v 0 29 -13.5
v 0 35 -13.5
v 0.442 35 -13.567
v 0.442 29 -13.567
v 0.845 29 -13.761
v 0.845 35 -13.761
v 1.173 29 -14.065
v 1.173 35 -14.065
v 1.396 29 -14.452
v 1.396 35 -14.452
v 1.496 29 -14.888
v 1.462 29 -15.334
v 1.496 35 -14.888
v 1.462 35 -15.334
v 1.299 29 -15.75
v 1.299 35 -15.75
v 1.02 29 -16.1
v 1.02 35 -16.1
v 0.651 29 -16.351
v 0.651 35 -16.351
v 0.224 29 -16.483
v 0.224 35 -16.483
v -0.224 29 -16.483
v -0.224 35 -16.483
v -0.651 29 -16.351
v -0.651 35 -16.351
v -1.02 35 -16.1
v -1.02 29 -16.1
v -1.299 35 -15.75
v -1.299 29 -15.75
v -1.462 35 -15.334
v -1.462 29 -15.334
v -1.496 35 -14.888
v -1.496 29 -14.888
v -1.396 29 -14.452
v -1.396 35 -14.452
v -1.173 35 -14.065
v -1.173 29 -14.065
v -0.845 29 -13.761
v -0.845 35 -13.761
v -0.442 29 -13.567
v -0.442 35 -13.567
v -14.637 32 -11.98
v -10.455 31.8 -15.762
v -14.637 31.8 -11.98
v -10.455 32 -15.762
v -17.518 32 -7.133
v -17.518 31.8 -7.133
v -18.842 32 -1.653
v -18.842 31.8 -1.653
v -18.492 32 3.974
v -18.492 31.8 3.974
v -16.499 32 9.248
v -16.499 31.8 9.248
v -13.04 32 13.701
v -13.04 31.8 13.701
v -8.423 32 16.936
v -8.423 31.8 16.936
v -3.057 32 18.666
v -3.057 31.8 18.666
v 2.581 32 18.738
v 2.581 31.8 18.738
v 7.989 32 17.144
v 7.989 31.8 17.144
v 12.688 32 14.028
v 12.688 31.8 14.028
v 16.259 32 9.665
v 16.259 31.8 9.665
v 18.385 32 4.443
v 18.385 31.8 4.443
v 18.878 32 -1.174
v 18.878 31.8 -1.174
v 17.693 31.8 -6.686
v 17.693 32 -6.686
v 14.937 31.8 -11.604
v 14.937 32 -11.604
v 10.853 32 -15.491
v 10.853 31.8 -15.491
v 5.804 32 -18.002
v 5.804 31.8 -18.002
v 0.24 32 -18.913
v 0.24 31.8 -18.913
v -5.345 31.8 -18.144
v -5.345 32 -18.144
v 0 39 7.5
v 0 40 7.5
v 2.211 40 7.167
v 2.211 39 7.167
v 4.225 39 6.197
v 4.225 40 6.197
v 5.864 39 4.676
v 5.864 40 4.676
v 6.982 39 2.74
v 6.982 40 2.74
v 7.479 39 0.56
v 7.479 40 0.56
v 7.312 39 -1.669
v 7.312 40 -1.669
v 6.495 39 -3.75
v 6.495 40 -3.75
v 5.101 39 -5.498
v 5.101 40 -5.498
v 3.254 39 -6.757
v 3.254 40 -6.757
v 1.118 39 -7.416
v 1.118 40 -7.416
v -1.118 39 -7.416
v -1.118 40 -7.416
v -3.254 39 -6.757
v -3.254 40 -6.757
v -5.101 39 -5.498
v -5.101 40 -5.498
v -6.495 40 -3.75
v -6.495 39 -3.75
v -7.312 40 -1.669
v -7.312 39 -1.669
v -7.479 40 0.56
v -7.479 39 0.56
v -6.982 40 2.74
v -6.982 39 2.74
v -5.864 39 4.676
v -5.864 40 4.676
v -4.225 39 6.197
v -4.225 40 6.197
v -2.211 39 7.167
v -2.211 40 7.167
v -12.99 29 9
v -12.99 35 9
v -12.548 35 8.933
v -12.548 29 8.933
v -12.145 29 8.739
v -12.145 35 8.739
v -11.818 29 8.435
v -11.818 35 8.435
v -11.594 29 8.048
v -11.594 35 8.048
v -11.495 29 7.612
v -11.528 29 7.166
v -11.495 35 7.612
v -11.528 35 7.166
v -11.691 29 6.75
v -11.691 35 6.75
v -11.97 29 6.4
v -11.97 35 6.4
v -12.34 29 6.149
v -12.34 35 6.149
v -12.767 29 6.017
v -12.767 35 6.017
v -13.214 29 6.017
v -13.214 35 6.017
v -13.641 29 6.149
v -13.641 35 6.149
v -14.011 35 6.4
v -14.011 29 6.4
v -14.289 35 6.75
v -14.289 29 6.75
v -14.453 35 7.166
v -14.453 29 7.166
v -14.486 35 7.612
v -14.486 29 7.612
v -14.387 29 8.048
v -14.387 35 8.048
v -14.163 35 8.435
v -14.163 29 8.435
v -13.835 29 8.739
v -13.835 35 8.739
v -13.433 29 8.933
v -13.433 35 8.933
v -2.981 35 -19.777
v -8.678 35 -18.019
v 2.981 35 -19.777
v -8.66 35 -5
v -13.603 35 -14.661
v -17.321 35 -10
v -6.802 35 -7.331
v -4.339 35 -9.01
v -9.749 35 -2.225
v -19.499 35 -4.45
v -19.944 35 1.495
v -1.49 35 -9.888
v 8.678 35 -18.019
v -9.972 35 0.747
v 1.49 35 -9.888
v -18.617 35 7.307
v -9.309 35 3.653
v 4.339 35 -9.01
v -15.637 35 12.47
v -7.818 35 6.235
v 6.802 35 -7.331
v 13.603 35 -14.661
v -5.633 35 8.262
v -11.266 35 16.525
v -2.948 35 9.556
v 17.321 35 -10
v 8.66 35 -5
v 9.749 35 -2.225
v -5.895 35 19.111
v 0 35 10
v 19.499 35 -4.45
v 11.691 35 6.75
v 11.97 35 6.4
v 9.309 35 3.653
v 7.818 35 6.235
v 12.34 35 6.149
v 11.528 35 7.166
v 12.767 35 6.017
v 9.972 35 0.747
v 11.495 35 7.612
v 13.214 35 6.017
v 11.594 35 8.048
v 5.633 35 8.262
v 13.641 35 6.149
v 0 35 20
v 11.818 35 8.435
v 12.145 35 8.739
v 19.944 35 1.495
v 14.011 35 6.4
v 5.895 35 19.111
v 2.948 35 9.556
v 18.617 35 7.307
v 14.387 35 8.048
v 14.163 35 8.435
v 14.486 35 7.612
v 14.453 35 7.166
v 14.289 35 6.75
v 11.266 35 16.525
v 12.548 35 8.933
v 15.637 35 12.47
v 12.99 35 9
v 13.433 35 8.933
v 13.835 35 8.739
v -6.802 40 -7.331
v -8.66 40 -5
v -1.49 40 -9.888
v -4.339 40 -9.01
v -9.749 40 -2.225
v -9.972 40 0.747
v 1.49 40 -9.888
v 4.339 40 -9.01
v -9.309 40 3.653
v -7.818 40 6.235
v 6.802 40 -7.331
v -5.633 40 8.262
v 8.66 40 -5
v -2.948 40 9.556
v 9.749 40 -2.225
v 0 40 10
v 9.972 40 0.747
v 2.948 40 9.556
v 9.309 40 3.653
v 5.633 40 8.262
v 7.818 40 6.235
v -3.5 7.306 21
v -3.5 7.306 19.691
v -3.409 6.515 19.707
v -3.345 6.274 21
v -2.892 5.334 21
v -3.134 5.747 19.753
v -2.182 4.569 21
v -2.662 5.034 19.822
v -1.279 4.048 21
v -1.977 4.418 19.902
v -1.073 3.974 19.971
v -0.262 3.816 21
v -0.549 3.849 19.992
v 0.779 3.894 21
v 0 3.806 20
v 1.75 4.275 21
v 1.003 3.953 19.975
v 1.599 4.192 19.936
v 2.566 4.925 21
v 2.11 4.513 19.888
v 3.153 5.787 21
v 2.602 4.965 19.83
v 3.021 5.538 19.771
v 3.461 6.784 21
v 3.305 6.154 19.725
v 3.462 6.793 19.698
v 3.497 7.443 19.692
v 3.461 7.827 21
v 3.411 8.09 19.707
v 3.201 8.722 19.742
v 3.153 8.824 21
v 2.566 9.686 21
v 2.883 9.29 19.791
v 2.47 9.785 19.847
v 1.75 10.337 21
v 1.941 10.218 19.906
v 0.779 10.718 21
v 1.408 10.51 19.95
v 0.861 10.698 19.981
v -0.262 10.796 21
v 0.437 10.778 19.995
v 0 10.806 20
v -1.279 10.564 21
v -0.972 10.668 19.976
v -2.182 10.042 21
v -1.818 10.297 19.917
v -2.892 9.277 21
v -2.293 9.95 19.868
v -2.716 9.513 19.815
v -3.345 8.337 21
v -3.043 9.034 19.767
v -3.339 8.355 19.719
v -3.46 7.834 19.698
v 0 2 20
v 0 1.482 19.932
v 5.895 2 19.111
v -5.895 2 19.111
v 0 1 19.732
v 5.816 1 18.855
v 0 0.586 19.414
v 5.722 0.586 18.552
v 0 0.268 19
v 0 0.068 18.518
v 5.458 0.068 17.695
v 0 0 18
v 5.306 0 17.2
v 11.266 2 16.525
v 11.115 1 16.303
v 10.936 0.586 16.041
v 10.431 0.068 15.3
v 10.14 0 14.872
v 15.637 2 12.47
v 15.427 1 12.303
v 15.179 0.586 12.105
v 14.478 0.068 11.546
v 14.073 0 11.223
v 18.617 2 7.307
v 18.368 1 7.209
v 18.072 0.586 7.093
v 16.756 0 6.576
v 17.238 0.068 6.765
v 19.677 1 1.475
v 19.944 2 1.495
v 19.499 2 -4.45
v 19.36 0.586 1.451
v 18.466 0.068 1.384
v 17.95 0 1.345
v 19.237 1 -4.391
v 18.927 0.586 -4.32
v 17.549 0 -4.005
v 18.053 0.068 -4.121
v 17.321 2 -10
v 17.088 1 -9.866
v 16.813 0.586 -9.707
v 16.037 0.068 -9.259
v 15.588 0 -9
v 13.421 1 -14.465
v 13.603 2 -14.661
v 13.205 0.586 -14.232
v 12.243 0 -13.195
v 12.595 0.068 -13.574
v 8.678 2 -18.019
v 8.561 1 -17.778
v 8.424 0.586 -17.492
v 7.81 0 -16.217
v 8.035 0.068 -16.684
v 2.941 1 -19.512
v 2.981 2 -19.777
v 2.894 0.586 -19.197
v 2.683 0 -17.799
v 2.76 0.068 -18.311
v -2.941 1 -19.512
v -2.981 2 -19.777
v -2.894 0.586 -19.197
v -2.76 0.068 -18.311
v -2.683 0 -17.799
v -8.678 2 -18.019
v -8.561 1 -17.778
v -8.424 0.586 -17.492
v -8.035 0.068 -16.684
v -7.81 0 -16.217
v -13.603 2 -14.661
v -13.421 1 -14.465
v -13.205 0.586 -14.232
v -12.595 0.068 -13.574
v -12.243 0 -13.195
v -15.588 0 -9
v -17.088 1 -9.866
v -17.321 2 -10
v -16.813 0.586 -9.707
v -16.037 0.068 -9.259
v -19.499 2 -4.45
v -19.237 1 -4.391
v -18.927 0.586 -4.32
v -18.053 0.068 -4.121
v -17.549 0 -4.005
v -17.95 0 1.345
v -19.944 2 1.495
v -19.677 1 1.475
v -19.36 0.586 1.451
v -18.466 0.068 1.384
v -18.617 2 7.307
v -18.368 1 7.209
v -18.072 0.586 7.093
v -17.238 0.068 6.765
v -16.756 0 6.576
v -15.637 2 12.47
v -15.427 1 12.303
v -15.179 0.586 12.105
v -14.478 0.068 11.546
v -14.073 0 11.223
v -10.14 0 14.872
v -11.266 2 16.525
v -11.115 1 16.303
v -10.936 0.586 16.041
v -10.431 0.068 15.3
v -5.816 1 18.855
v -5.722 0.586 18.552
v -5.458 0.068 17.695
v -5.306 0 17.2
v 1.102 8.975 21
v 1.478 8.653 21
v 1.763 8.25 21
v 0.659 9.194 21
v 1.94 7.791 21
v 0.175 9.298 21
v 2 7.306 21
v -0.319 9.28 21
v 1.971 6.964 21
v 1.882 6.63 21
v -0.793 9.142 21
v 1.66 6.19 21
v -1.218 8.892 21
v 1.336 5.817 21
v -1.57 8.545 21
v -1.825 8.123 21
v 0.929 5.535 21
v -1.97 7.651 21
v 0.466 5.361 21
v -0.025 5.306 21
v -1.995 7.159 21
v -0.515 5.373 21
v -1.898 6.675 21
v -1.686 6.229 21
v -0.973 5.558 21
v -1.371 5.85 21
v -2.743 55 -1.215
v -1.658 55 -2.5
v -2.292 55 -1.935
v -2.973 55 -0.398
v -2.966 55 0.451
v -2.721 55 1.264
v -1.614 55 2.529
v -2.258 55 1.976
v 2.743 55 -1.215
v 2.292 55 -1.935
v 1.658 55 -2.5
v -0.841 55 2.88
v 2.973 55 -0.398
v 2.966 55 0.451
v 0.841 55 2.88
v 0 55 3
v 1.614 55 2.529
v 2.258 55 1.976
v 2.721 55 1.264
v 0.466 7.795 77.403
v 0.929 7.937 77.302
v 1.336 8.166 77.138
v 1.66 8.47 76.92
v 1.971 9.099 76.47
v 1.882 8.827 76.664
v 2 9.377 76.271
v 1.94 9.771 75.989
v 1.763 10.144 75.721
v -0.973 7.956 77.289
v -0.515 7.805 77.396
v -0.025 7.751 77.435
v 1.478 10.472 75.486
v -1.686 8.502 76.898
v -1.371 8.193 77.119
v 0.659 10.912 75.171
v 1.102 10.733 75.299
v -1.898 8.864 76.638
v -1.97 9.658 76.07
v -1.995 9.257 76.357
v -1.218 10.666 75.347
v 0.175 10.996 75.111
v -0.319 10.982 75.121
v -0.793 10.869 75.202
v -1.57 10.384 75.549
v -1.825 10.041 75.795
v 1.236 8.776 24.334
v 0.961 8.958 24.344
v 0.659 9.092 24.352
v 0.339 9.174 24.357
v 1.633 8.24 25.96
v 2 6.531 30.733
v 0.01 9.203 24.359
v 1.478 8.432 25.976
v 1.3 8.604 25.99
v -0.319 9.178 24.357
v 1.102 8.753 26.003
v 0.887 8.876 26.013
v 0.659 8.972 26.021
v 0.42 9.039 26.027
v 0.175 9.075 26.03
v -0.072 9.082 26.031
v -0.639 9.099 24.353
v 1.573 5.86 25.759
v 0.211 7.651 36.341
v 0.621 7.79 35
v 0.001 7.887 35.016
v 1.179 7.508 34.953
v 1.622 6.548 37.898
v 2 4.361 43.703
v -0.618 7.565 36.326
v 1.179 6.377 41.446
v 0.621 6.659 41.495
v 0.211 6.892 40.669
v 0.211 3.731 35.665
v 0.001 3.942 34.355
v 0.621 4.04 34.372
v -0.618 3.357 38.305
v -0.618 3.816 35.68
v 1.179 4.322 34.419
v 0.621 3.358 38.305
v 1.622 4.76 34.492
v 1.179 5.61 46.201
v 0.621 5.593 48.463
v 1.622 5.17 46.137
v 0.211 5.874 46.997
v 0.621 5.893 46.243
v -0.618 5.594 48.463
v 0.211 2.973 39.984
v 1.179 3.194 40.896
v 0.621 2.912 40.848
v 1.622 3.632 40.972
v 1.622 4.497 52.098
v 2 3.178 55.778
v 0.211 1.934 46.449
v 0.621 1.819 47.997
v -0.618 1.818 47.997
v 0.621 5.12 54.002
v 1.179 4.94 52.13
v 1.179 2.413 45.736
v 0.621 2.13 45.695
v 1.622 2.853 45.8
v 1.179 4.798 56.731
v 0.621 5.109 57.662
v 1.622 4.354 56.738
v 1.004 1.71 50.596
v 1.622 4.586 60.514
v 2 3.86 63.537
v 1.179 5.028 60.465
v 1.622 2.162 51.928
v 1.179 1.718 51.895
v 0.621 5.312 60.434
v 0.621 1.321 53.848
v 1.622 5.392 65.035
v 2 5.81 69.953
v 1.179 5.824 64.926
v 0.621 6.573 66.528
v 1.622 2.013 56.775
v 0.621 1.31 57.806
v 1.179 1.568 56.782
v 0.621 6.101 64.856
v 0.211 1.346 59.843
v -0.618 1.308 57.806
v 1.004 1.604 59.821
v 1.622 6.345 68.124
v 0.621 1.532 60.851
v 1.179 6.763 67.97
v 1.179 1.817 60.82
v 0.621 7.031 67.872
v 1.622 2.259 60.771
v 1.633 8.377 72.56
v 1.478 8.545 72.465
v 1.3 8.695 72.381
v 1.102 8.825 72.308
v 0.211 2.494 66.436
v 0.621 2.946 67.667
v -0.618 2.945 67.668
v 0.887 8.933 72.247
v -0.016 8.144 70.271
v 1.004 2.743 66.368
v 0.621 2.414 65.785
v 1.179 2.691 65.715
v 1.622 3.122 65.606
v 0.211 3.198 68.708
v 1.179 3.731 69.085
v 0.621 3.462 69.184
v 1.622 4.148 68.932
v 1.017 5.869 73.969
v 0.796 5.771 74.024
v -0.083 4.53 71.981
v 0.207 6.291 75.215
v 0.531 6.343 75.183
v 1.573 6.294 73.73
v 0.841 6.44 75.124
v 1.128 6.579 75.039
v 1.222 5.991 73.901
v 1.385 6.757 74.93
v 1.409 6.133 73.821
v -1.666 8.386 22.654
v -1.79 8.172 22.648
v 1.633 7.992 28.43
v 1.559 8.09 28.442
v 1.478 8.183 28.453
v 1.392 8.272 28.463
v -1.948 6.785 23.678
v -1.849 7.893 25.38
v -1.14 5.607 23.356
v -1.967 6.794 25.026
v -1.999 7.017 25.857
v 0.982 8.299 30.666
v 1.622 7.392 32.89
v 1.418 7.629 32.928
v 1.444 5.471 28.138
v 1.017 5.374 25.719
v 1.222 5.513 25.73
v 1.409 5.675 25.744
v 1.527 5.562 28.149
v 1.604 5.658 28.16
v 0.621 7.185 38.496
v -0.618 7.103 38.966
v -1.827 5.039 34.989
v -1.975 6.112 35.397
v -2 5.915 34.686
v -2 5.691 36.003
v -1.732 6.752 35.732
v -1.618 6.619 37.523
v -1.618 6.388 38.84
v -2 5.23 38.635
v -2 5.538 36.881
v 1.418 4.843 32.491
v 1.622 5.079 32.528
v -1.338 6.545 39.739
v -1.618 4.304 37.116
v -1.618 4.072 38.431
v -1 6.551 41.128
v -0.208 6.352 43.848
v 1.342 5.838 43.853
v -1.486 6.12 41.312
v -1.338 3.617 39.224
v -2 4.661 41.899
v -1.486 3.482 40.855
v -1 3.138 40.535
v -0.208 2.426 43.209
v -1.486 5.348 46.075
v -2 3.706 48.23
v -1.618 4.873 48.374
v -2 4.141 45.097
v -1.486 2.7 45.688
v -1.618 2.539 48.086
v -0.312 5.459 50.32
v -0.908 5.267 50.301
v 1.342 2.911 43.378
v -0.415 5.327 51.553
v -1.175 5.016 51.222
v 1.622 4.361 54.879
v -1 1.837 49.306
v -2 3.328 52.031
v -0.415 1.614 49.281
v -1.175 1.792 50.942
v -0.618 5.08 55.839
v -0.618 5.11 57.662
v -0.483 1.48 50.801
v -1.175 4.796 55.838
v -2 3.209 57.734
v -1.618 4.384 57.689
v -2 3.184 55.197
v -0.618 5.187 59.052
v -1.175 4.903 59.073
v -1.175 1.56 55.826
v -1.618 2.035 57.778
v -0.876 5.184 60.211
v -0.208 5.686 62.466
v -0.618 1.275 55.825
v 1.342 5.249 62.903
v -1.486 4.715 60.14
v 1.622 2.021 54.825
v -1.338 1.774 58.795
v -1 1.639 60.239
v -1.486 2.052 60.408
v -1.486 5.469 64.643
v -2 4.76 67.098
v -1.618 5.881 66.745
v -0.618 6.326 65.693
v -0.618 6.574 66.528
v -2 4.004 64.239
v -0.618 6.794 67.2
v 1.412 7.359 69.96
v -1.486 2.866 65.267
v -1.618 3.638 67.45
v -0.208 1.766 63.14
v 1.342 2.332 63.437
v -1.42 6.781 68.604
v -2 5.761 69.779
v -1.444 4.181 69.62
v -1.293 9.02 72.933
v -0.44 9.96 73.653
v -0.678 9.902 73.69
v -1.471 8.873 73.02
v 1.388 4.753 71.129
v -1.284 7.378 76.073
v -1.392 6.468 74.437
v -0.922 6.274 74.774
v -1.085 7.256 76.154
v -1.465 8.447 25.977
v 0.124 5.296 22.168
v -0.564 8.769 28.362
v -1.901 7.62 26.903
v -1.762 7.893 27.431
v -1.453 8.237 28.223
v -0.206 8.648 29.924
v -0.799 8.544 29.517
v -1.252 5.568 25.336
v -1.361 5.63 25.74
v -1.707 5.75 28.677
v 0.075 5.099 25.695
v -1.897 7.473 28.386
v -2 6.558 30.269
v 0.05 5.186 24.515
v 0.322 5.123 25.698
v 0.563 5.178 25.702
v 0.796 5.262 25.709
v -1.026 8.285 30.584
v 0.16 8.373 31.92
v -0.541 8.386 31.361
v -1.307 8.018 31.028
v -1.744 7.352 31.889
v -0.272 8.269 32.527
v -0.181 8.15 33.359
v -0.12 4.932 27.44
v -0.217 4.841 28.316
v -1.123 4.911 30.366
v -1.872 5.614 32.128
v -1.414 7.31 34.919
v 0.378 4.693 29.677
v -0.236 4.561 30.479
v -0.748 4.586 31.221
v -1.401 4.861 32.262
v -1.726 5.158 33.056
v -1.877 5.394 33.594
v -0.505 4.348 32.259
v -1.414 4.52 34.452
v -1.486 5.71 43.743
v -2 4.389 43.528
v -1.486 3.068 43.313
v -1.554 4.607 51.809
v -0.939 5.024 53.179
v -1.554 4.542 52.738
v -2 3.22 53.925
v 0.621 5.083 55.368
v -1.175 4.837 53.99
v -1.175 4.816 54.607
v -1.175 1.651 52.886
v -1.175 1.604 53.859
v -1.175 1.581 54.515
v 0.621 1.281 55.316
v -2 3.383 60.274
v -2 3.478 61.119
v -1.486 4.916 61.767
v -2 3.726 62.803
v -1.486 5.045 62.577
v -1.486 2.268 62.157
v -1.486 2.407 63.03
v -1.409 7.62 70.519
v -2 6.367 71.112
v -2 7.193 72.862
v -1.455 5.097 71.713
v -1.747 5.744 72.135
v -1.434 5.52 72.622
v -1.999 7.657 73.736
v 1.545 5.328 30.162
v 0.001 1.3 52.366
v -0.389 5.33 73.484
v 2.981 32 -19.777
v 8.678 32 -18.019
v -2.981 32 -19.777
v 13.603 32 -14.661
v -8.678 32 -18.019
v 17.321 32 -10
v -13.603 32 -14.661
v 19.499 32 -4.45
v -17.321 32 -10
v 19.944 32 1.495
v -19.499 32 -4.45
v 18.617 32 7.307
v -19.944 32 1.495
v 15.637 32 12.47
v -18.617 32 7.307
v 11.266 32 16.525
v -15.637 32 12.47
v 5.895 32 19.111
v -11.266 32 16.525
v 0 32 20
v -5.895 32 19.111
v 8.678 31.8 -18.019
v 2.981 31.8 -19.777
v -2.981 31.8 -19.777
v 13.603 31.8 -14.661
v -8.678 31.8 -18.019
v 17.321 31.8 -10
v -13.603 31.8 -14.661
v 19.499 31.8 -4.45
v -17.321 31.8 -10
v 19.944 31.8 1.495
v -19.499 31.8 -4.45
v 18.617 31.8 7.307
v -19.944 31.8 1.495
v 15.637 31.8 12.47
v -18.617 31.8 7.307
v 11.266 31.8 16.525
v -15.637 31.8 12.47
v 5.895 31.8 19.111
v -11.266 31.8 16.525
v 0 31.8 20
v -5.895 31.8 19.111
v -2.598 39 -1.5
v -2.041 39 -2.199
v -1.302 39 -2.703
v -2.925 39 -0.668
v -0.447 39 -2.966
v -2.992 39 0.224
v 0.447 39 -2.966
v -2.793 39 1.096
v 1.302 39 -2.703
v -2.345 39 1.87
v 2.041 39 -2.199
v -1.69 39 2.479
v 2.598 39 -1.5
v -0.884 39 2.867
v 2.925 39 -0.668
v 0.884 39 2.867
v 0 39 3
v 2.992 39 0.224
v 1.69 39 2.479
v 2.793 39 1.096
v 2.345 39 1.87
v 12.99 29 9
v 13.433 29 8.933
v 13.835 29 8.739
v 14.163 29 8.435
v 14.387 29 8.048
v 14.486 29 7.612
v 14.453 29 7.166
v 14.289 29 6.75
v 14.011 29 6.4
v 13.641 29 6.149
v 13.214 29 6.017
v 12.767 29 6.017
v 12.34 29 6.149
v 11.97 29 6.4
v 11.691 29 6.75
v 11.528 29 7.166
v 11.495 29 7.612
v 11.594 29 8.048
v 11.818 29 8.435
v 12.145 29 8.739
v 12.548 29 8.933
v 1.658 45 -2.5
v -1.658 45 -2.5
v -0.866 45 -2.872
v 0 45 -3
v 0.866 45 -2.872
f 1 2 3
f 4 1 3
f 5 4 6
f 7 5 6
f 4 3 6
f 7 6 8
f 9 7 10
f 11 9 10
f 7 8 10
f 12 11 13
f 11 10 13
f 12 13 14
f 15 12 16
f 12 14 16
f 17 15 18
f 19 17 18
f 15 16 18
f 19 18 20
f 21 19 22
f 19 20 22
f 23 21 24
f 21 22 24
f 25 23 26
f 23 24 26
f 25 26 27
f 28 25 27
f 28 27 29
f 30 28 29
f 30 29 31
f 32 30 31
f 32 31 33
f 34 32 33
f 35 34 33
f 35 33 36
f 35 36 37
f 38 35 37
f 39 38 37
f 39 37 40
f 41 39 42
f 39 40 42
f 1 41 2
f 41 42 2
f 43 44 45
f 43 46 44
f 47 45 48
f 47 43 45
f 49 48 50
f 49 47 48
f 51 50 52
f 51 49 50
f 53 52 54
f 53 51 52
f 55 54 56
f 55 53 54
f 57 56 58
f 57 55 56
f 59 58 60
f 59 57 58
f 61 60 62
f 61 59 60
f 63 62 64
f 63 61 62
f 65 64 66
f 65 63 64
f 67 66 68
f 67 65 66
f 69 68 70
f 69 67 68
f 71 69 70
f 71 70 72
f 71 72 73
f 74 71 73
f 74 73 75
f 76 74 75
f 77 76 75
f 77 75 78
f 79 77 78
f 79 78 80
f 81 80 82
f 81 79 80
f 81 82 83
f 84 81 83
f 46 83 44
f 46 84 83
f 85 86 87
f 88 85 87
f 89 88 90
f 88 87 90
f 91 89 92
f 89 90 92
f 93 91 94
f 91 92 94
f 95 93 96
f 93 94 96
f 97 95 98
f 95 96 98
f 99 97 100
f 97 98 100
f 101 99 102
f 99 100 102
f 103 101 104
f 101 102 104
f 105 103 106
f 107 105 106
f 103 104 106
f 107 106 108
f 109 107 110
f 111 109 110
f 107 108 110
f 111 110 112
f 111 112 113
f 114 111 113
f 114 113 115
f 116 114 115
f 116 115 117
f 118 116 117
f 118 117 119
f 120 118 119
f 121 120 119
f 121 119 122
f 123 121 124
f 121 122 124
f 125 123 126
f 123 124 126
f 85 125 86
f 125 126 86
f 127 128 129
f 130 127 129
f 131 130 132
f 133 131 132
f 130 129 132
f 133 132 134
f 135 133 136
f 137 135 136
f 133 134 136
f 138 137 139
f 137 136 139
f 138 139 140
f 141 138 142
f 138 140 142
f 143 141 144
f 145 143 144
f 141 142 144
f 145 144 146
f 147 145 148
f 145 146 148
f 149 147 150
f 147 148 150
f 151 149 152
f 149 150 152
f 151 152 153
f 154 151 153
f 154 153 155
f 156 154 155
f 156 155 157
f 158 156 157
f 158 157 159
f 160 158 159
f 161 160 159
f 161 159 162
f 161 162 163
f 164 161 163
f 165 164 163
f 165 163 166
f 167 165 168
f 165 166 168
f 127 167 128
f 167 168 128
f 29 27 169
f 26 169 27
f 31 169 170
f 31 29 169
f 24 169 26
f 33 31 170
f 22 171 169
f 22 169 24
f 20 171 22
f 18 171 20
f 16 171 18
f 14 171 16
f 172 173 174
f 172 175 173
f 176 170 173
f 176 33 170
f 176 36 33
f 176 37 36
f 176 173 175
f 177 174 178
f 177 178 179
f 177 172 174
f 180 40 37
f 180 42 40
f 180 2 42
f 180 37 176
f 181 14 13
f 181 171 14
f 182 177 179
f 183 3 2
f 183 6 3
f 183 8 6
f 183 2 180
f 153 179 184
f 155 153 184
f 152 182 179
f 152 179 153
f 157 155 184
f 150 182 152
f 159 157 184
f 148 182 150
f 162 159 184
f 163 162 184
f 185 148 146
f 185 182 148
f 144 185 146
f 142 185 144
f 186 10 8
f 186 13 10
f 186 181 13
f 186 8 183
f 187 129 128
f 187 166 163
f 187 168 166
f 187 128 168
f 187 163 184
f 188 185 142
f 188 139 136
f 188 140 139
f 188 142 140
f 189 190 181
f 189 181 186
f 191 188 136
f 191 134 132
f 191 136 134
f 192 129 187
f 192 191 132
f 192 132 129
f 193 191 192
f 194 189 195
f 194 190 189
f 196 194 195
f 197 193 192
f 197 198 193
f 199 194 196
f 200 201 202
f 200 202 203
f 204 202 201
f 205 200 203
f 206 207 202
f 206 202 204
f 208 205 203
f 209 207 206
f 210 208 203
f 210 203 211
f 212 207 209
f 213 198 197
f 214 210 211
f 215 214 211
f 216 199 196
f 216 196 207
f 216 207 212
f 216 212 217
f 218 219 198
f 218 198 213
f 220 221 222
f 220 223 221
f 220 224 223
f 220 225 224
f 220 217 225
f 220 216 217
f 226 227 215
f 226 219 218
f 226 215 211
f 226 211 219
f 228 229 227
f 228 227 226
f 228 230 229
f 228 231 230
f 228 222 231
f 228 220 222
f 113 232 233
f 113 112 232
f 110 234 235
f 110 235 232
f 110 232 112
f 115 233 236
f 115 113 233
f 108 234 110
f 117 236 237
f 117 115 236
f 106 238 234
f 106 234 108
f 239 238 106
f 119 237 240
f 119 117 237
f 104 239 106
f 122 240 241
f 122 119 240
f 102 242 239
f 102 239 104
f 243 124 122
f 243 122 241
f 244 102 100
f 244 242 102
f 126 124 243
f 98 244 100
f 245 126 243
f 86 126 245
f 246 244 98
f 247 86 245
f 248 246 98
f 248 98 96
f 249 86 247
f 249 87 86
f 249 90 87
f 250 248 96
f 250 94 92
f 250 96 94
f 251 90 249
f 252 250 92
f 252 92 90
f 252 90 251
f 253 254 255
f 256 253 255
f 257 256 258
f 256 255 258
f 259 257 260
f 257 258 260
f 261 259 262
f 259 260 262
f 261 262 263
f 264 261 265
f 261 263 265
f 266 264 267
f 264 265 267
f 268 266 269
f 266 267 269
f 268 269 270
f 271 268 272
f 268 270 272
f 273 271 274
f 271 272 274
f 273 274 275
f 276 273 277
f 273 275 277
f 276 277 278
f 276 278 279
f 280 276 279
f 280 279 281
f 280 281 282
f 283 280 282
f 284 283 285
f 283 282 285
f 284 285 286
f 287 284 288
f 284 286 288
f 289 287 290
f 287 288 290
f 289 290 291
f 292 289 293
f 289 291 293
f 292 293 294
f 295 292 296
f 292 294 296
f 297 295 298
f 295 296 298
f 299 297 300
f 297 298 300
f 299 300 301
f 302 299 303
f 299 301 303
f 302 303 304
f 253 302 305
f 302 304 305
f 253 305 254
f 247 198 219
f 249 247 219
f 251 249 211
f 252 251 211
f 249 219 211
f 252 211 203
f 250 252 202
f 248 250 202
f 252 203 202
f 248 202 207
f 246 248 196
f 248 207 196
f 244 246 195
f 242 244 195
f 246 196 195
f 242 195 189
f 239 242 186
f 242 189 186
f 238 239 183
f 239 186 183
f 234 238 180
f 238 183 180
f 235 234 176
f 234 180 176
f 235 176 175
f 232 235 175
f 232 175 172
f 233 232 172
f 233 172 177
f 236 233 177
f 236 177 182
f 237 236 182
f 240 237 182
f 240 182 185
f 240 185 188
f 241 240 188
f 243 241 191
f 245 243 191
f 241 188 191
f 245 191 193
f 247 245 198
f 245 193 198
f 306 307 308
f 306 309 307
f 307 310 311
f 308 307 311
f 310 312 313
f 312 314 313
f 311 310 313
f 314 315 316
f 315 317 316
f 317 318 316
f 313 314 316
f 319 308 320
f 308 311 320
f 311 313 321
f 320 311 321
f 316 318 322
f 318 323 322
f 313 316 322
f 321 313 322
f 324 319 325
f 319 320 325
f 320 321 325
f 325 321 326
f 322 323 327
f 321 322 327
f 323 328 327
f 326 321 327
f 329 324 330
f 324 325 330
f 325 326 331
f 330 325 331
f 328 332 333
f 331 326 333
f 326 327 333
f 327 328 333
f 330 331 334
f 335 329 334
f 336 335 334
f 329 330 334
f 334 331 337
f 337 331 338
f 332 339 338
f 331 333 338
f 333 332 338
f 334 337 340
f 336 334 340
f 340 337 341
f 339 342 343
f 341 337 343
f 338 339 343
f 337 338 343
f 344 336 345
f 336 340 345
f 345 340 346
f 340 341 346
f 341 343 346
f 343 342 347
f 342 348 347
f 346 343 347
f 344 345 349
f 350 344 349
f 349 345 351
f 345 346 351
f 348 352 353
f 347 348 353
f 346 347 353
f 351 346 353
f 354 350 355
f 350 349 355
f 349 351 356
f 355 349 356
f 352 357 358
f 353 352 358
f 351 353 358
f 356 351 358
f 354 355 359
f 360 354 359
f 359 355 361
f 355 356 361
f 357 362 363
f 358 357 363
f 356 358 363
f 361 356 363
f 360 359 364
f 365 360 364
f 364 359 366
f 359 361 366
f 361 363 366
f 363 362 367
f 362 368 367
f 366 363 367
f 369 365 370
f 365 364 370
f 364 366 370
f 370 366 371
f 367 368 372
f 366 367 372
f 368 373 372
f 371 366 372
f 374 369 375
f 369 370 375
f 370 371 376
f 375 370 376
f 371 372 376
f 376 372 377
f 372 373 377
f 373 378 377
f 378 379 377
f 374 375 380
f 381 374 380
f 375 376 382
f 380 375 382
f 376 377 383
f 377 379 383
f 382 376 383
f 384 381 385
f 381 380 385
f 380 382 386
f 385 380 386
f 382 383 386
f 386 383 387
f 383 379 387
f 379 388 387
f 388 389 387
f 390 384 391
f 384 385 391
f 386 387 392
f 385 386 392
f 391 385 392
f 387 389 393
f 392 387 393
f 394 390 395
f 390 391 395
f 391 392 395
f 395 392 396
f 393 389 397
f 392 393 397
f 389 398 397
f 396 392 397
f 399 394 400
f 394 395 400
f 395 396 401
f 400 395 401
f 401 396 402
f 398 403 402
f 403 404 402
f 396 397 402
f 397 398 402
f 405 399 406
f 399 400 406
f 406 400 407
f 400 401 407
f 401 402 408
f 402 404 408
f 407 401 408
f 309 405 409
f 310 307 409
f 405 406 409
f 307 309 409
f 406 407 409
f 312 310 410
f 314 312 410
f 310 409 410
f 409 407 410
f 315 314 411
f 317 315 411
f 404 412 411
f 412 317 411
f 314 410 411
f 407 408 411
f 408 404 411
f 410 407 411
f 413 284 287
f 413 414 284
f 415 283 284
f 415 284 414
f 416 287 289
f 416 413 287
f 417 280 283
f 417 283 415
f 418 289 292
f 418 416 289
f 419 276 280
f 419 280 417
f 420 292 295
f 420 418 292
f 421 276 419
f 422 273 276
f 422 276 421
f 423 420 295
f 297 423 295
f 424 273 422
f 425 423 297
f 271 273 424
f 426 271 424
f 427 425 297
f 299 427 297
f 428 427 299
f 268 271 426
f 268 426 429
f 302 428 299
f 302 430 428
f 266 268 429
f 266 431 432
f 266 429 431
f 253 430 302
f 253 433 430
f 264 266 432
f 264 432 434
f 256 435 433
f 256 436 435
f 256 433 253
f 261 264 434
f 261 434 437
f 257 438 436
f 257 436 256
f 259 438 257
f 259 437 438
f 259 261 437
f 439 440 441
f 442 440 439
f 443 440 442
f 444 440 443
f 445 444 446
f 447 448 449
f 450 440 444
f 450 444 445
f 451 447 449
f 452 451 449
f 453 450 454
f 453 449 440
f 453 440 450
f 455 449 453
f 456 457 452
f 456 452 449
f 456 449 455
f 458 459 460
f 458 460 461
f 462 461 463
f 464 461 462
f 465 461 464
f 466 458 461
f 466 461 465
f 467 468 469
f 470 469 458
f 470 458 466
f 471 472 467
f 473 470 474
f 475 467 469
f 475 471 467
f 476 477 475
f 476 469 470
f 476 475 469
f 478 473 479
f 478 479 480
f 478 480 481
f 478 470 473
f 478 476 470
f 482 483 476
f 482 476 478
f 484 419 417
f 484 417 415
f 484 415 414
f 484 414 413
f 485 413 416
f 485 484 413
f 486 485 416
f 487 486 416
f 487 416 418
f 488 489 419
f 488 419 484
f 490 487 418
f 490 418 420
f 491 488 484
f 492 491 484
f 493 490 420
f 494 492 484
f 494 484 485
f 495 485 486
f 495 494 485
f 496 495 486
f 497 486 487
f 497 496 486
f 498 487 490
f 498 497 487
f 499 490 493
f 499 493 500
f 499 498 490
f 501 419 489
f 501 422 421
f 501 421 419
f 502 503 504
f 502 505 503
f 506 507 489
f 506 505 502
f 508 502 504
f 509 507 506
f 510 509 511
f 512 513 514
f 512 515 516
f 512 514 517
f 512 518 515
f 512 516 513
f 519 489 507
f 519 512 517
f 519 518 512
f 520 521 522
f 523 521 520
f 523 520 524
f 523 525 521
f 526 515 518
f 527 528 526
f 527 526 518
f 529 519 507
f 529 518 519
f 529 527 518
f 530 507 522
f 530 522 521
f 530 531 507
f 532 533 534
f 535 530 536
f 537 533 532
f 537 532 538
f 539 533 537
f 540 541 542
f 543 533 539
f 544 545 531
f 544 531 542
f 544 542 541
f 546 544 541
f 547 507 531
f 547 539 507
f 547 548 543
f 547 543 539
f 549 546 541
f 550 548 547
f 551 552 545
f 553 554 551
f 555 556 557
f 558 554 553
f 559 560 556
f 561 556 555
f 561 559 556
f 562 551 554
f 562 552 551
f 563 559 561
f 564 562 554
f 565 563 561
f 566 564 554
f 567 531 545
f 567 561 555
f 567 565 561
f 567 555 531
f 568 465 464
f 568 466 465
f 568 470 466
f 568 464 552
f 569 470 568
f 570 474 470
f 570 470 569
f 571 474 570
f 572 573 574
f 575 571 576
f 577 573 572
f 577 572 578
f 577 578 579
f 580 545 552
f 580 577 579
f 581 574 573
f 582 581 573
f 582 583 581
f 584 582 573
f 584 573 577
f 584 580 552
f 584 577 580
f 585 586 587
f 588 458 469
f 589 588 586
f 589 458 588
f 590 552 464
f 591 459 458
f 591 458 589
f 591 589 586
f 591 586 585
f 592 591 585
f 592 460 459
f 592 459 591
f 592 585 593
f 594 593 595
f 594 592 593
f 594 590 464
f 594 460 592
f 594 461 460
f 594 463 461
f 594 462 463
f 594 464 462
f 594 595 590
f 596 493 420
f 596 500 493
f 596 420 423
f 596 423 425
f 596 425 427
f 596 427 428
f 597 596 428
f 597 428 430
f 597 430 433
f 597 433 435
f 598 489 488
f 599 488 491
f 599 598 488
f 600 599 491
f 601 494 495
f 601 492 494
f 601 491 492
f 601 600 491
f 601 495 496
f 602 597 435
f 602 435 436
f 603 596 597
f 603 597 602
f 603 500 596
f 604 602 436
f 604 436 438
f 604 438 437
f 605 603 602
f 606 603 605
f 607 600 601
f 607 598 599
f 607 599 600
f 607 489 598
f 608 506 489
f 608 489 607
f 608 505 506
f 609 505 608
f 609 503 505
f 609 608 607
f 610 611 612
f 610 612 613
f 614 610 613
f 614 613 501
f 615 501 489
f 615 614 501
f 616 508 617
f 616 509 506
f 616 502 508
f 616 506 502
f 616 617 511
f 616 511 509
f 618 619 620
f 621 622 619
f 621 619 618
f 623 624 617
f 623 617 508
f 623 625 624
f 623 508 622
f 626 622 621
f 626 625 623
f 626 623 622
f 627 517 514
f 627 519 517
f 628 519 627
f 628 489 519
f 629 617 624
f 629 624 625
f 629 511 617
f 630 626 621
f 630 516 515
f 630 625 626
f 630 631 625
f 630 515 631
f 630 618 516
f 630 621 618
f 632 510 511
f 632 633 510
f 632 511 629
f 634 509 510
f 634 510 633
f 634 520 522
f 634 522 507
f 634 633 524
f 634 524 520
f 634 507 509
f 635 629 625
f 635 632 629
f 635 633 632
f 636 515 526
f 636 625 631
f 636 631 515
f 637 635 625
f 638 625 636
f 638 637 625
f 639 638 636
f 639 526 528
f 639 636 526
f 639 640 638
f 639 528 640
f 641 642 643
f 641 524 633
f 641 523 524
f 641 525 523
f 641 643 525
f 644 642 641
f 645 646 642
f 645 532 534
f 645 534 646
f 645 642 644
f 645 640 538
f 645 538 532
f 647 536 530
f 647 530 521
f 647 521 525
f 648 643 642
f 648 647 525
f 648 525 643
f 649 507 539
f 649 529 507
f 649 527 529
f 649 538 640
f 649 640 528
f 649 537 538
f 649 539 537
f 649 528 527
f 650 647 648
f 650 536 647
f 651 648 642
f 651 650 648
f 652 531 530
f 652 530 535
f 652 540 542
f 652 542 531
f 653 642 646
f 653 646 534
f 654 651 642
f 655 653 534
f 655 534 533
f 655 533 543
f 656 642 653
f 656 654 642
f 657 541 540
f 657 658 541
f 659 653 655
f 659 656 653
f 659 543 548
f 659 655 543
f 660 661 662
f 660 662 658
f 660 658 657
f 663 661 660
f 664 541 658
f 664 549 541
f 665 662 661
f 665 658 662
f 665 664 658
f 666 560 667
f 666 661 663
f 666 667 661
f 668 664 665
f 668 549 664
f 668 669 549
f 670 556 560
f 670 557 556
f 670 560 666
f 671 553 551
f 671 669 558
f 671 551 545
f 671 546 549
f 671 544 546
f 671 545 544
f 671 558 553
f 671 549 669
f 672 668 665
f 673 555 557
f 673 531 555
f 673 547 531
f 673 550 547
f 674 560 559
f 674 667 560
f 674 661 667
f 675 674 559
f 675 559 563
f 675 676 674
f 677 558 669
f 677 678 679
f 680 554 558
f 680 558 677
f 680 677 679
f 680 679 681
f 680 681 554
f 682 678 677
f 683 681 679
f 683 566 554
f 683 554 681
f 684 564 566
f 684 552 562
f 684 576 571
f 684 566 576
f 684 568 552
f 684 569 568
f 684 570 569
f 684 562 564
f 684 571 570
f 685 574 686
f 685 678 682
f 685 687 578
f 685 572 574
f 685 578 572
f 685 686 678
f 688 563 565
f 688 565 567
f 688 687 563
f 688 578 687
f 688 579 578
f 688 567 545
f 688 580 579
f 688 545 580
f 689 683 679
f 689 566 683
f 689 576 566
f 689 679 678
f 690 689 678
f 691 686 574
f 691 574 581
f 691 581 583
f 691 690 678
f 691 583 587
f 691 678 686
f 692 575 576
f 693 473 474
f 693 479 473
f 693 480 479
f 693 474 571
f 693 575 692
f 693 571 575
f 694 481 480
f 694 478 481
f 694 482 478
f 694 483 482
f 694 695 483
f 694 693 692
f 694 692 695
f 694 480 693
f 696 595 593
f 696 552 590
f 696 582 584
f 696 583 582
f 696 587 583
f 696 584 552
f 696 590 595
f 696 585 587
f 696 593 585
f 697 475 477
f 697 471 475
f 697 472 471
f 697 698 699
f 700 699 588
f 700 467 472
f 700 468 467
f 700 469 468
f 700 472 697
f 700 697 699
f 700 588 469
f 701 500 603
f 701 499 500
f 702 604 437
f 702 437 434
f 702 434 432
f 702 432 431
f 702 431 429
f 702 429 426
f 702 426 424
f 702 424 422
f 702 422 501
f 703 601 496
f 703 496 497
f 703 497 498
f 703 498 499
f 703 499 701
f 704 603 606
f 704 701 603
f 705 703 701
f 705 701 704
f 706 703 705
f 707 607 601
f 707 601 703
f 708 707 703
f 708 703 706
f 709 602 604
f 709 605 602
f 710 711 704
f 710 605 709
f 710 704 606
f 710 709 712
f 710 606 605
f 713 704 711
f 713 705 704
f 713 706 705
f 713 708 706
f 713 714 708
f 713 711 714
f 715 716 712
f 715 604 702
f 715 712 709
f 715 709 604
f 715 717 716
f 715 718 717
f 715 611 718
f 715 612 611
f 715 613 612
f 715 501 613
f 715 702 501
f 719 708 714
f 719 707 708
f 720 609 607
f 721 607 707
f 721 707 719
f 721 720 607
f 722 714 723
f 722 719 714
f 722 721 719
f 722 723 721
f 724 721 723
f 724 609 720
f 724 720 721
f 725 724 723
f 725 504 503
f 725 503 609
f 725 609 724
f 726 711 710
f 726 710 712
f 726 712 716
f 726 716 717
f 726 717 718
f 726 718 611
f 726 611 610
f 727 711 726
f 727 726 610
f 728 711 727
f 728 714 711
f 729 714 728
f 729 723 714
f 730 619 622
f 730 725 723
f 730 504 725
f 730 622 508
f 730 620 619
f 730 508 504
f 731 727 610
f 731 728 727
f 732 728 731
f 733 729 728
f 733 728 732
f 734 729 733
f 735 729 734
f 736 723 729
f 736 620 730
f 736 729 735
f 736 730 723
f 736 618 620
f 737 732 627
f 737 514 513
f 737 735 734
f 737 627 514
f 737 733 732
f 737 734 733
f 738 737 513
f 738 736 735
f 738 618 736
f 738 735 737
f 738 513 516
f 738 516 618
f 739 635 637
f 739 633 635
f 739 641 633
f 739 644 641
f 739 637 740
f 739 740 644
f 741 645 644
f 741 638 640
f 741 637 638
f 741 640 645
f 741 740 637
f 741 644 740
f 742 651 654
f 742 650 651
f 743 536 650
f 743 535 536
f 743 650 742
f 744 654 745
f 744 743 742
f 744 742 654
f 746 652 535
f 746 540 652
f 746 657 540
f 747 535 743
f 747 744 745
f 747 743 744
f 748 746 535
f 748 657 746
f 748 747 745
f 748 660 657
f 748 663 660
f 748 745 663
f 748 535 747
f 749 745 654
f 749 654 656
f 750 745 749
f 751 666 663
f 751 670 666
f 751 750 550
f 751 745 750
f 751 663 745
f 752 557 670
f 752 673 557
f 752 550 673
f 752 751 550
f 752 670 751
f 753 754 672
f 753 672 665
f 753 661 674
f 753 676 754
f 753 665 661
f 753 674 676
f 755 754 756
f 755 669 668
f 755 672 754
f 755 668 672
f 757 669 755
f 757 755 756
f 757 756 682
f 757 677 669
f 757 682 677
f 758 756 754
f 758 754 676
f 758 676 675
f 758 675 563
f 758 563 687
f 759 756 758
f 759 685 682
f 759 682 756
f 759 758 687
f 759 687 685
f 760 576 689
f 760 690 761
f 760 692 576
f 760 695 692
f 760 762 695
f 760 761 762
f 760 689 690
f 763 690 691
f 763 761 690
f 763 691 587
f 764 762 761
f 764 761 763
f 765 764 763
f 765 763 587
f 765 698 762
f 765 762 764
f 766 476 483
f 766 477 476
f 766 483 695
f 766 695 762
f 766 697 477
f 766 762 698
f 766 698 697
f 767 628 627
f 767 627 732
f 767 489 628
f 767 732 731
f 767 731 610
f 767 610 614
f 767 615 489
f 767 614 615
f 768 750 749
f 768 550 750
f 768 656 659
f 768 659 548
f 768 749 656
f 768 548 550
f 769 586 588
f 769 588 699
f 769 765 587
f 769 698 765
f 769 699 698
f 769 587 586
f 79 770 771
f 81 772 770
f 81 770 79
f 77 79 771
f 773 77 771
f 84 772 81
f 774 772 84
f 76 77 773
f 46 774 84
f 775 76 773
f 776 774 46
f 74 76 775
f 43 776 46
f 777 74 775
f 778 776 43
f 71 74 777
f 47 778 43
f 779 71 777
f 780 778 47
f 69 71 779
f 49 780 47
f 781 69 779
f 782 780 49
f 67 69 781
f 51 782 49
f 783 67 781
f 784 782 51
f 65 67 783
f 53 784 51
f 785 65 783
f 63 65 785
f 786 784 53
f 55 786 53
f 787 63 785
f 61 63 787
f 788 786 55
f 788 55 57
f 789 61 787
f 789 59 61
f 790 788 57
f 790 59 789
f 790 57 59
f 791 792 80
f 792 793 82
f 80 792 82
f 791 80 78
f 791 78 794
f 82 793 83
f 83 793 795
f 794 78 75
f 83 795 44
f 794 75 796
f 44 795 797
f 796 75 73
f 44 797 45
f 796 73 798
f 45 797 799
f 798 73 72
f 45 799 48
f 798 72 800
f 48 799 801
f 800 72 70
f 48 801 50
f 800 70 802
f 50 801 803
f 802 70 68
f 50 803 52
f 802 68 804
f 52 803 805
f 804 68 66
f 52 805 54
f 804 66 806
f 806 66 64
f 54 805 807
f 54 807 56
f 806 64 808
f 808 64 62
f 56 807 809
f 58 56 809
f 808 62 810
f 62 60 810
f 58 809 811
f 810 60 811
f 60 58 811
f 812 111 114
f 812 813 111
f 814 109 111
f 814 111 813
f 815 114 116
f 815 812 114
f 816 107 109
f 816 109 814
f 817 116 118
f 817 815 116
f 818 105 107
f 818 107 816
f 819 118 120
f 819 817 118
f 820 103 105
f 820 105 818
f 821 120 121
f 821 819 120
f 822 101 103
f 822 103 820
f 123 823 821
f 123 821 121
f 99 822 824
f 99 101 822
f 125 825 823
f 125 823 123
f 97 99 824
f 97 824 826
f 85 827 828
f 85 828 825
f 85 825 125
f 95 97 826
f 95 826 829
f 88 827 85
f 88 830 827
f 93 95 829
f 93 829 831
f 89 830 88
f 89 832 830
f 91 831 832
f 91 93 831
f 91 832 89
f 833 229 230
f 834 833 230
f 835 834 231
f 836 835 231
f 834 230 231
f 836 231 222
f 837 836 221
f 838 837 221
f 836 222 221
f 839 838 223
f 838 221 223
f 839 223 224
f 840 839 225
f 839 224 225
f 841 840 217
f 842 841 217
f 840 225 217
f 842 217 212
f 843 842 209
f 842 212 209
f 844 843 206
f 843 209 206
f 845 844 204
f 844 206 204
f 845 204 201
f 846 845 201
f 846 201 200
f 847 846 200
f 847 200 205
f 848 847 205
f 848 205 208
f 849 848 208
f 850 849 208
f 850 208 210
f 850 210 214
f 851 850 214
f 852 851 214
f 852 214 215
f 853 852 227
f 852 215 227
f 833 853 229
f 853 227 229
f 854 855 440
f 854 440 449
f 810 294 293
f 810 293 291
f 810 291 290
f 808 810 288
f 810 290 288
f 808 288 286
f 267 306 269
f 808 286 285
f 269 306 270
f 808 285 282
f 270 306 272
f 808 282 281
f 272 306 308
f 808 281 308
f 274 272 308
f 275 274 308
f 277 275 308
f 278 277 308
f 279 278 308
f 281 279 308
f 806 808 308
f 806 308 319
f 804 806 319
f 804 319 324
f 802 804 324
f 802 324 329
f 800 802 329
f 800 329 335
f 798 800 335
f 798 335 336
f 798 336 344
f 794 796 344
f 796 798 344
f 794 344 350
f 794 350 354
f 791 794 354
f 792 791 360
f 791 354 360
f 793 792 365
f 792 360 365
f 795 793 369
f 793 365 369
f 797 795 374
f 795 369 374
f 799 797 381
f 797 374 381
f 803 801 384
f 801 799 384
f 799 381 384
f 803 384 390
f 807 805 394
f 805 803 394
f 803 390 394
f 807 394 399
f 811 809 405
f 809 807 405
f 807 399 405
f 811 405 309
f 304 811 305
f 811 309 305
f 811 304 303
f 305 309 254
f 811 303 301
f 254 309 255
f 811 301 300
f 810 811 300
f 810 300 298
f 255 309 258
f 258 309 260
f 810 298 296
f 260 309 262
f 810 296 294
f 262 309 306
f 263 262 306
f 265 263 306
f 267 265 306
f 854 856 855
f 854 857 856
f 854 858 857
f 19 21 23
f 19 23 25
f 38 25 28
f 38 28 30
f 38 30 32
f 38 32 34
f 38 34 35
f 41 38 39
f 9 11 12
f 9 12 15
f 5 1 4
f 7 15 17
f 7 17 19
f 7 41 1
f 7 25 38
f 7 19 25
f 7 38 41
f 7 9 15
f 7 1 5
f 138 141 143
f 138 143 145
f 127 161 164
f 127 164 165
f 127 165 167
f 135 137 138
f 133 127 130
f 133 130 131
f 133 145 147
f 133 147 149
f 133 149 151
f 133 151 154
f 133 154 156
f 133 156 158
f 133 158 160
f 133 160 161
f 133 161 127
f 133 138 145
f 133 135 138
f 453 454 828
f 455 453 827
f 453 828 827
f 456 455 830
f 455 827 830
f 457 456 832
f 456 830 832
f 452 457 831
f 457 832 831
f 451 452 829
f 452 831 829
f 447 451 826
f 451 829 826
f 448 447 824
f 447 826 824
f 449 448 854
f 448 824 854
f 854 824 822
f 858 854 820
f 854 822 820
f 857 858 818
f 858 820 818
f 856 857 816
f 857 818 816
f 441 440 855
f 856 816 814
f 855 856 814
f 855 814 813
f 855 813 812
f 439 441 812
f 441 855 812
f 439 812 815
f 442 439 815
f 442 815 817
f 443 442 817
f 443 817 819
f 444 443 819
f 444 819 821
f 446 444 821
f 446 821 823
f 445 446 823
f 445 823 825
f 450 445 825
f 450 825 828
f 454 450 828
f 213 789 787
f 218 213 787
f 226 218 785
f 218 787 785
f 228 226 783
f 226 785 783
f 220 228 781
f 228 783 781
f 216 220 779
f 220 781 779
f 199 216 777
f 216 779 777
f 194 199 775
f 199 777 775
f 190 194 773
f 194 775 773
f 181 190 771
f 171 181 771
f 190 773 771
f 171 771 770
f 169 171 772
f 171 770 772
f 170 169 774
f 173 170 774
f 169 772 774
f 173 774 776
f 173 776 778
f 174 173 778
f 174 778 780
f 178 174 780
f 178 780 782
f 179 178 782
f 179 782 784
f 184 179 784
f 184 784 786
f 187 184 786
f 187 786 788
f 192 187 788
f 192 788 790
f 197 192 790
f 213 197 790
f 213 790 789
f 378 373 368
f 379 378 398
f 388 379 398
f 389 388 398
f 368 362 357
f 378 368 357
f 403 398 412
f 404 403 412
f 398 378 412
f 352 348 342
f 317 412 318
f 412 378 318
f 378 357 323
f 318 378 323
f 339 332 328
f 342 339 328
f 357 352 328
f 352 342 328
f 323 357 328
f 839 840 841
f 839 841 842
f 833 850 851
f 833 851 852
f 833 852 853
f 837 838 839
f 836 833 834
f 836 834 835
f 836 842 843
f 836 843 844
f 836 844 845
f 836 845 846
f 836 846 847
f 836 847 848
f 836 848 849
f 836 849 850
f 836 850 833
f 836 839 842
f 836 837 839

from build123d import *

# Parameters (mm, degrees)
SKETCH1_R           = 20
BOSS_EXTRUDE1_DEPTH = 35
SKETCH3_R           = 10
BOSS_EXTRUDE3_DEPTH = 5
SKETCH4_R           = 7.5
CUT_EXTRUDE1_DEPTH  = 1
SKETCH5_R           = 3
BOSS_EXTRUDE4_DEPTH = 16
SKETCH6_W           = 5.83666228
SKETCH6_H           = 4.189609368
CUT_EXTRUDE2_DEPTH  = 10
SKETCH10_W          = 2.171108564
SKETCH10_H          = 0.2
SKETCH11_R          = 3.5
BOSS_EXTRUDE5_DEPTH = 21
SKETCH12_R          = 2
FILLET1_R           = 2
SKETCH24_R          = 1.5
CUT_EXTRUDE3_DEPTH  = 6


with BuildPart() as part:
    # Sketch1 → Boss-Extrude1 (new body)
    with BuildSketch(Plane(origin=(0, 0, 0), x_dir=(1, 0, 0), z_dir=(0, 1, 0))):
        Circle(SKETCH1_R)
    extrude(amount=BOSS_EXTRUDE1_DEPTH)

    # Sketch3 → Boss-Extrude3 (add)
    with BuildSketch(Plane(origin=(0, 35, 0), x_dir=(1, 0, 0), z_dir=(0, 1, 0))):
        Circle(SKETCH3_R)
    extrude(amount=BOSS_EXTRUDE3_DEPTH)

    # Sketch4 → Cut-Extrude1 (cut)
    with BuildSketch(Plane(origin=(0, 40, 0), x_dir=(1, 0, 0), z_dir=(0, 1, 0))):
        Circle(SKETCH4_R)
    extrude(amount=-CUT_EXTRUDE1_DEPTH, mode=Mode.SUBTRACT)

    # Sketch5 → Boss-Extrude4 (add)
    with BuildSketch(Plane(origin=(0, 39, 0), x_dir=(1, 0, 0), z_dir=(0, 1, 0))):
        Circle(SKETCH5_R)
    extrude(amount=BOSS_EXTRUDE4_DEPTH)

    # Sketch6 → Cut-Extrude2 (cut)
    with BuildSketch(Plane(origin=(0, 55, 0), x_dir=(1, 0, 0), z_dir=(0, 1, 0))):
        with Locations((0, 4.594804684)):
            Rectangle(SKETCH6_W, SKETCH6_H)
    extrude(amount=-CUT_EXTRUDE2_DEPTH, mode=Mode.SUBTRACT)

    # Sketch10 → Cut-Revolve1 (revolve, cut)
    with BuildSketch(Plane.XY):
        with Locations((20, 31.9)):
            Rectangle(SKETCH10_W, SKETCH10_H)
    revolve(axis=Axis((0, 0, 0), (0, 1, 0)), mode=Mode.SUBTRACT)

    # Sketch11 → Boss-Extrude5 (add)
    with BuildSketch(Plane.XY):
        with Locations((0, 7.305759765)):
            Circle(SKETCH11_R)
    extrude(amount=BOSS_EXTRUDE5_DEPTH)

    # Sweep1: sweep along a path in Sketch13
    with BuildLine() as sweep1_path:  # in the path sketch's own coordinates; laid on its plane below (add() does not lay a ready-made edge on the line's plane)
        add(Edge.make_bspline(
            [(-21, 7.305759765), (-39.680829044, 7.305759765), (-58.658536918, -3.239081936), (-76.270922844, 9.376545434)],
            knots=[0, 0, 0, 0, 1, 1, 1, 1], degree=3))
    # Sketch12 → Sweep1 (sweep)
    with BuildSketch(Plane.XY.offset(21)):
        with Locations((0, 7.305759765)):
            Circle(SKETCH12_R)
    sweep(path=Plane(origin=(0, 0, 0), x_dir=(0, 0, -1), z_dir=(1, 0, 0)) * sweep1_path.line)

    # Fillet1
    fillet1_edges = [part.edges().sort_by_distance(p)[0] for p in [
        (-20, 0, 0),
    ]]
    fillet(fillet1_edges, radius=FILLET1_R)

    # Sketch24 → Cut-Extrude3 (cut)
    with BuildSketch(Plane(origin=(0, 35, 0), x_dir=(1, 0, 0), z_dir=(0, 1, 0))):
        with Locations((0, 15)):
            Circle(SKETCH24_R)
        with Locations((12.990381057, -7.5)):
            Circle(SKETCH24_R)
        with Locations((-12.990381057, -7.5)):
            Circle(SKETCH24_R)
    extrude(amount=-CUT_EXTRUDE3_DEPTH, mode=Mode.SUBTRACT)


solid = part.part
